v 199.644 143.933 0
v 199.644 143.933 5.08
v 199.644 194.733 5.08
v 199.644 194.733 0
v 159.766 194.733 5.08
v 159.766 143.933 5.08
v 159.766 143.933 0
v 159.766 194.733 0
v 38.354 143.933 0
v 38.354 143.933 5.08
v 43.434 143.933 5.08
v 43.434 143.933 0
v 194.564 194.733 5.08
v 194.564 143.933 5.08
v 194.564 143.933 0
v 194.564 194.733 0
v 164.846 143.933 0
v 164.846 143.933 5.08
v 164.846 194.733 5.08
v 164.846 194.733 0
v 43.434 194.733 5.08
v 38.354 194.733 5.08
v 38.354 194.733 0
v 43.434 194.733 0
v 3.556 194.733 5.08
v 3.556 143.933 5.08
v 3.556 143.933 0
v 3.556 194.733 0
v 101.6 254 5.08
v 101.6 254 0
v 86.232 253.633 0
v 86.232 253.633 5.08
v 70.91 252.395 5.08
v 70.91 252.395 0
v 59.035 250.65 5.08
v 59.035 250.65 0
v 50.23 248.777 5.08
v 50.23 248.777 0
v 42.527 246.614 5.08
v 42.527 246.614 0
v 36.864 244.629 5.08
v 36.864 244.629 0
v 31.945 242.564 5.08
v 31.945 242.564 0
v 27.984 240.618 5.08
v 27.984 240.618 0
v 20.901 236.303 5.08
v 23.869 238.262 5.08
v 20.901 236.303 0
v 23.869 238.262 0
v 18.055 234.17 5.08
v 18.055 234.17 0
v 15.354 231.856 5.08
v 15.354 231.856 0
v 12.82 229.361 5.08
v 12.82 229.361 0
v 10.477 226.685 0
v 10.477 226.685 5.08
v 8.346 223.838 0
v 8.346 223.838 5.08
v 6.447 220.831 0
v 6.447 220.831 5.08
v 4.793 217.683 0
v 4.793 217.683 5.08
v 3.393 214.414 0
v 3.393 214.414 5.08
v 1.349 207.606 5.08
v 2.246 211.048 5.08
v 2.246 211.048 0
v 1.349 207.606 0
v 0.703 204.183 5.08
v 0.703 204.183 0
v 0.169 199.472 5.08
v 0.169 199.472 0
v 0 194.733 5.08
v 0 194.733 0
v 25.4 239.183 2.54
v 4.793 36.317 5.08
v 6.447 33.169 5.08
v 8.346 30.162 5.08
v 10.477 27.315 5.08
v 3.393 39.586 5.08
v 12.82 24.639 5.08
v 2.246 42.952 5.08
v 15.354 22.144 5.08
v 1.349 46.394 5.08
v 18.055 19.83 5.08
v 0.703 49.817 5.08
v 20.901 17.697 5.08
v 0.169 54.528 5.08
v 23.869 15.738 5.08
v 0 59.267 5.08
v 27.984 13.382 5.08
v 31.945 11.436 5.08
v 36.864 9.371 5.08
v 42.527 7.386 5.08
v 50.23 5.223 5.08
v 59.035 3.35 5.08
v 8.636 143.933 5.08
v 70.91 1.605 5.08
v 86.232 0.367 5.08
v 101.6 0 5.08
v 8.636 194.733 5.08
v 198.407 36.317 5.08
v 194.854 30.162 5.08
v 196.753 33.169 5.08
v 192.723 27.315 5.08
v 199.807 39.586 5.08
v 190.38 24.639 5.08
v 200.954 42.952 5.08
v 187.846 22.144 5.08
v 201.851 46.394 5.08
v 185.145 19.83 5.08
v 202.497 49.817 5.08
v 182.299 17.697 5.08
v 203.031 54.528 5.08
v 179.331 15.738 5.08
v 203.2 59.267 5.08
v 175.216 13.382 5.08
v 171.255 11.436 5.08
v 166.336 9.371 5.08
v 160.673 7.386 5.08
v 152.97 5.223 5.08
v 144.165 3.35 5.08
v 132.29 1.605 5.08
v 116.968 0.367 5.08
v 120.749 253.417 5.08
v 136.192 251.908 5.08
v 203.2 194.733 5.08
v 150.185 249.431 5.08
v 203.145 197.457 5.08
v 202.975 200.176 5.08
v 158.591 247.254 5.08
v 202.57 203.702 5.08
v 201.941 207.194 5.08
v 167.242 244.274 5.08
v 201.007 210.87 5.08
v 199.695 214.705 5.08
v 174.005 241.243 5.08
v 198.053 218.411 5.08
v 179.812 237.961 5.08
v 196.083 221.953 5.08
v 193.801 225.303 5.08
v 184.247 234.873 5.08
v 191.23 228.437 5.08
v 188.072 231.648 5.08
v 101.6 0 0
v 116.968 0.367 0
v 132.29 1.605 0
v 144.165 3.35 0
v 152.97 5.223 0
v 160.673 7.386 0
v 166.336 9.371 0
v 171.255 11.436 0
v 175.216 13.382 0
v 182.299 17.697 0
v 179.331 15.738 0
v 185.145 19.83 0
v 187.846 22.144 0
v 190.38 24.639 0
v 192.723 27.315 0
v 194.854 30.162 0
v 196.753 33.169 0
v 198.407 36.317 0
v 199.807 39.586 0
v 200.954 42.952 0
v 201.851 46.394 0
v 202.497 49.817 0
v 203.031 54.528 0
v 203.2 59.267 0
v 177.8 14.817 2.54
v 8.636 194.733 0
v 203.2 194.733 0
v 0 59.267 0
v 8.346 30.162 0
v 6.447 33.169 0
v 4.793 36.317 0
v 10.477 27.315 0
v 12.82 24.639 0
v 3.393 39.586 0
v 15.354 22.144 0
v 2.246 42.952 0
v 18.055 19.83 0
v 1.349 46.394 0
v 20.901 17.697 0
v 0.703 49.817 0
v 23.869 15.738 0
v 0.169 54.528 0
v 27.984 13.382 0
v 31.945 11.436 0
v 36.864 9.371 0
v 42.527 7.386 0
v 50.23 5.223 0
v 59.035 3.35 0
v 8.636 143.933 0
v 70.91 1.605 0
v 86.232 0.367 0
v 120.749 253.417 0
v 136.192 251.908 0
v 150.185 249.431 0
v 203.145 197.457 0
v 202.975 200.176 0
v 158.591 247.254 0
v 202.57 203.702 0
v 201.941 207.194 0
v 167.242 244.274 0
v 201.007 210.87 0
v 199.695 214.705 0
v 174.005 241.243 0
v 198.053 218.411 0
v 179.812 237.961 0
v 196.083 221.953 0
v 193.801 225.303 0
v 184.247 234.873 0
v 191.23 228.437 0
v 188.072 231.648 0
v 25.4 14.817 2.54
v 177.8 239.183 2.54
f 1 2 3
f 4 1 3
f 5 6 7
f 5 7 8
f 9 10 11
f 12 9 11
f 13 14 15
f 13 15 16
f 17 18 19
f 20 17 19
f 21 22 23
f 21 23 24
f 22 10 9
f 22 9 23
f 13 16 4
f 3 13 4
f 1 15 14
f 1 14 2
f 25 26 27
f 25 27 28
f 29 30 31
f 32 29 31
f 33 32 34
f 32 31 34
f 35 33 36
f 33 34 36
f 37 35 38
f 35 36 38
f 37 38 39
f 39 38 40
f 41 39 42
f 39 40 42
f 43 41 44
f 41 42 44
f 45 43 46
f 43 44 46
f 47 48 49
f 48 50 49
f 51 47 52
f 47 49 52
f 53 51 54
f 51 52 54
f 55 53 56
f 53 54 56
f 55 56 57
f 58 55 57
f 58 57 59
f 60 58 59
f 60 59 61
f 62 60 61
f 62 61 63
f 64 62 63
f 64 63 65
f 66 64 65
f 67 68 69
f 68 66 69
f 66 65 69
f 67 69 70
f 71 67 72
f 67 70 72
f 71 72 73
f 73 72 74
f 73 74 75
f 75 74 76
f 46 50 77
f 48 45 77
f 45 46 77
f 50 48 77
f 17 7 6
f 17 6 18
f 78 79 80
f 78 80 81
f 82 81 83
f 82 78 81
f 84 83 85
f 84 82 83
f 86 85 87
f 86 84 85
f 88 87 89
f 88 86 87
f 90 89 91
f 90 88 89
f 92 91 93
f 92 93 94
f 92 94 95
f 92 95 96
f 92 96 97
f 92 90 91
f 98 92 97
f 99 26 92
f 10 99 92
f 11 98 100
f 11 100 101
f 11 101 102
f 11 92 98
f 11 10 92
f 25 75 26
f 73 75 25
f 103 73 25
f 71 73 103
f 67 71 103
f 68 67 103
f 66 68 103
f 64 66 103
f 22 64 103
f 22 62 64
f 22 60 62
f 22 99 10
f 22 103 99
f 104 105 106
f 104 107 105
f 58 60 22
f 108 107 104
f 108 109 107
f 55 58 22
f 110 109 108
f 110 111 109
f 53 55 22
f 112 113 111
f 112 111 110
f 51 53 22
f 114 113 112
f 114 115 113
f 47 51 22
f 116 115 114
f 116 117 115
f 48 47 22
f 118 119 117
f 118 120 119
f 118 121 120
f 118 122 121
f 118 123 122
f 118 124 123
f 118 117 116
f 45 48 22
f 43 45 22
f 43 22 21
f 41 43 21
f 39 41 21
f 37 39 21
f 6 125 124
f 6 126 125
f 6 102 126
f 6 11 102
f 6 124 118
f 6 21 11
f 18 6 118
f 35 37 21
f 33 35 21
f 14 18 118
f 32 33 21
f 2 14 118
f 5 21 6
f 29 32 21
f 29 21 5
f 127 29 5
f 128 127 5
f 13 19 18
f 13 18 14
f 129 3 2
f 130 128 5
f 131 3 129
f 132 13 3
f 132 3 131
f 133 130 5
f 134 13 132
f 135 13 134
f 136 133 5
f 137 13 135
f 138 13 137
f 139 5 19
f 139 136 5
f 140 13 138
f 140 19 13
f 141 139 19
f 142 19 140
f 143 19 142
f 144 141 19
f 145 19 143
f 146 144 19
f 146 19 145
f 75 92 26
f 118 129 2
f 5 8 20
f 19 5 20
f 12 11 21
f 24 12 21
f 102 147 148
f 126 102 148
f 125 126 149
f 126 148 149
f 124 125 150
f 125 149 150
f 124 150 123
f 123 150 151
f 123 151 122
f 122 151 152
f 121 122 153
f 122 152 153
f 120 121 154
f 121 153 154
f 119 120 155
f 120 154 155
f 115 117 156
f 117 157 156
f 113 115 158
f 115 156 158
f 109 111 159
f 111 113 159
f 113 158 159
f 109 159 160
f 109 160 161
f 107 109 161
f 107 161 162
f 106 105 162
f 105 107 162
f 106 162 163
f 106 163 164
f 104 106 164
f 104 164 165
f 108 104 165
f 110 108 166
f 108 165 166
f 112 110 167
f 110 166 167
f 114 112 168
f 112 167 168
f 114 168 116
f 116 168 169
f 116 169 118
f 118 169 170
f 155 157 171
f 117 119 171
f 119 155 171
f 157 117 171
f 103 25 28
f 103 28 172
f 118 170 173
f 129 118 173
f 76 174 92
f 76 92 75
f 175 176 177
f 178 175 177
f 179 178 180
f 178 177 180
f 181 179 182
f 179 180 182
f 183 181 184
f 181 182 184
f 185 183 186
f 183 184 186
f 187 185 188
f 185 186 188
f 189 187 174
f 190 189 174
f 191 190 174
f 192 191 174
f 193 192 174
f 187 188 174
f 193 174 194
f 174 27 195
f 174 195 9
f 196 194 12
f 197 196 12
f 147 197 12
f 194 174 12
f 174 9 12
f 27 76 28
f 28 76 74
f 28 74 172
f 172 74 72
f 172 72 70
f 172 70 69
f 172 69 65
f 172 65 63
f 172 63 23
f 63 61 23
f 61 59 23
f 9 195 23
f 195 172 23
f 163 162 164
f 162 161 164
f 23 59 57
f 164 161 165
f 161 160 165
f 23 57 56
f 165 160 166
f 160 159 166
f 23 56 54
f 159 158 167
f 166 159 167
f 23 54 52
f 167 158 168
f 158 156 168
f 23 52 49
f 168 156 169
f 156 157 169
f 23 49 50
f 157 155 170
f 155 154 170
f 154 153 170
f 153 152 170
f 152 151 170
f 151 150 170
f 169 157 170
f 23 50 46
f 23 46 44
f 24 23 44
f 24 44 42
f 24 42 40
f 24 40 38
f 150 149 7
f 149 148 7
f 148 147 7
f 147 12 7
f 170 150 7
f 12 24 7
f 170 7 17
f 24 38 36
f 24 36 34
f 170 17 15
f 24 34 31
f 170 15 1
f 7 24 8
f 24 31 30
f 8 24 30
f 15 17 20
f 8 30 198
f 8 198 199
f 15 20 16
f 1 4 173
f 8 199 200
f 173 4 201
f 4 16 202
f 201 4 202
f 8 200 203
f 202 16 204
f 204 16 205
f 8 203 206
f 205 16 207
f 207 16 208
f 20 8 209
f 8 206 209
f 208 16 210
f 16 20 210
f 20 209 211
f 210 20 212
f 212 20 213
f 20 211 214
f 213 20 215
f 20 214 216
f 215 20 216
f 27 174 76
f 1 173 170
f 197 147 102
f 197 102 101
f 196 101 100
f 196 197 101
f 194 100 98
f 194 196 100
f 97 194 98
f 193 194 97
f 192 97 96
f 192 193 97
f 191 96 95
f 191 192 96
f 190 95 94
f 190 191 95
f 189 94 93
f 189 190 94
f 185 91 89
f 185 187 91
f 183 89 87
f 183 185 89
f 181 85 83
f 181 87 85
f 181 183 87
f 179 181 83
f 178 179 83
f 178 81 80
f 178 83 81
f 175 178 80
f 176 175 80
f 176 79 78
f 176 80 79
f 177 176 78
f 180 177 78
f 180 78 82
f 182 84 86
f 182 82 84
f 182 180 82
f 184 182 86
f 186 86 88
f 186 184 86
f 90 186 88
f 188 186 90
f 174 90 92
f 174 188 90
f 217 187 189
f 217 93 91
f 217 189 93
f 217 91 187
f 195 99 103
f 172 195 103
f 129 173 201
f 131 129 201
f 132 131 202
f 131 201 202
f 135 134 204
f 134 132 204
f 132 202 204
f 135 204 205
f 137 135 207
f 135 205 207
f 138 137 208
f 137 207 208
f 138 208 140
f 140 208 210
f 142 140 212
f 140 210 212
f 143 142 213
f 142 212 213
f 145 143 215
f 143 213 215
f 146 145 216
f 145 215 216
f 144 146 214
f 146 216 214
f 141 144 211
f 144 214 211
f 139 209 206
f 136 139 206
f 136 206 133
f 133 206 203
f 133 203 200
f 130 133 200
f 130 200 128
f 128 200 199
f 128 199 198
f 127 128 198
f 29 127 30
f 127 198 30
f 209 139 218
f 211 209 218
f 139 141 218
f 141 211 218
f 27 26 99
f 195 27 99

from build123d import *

# Parameters (mm, degrees)
SKETCH1_W           = 203.2
SKETCH1_H           = 254
BOSS_EXTRUDE1_DEPTH = 5.08
FILLET1_SIZE        = 59.266666667
FILLET1_SIZE_2      = 101.6
SKETCH7_W           = 5.08
SKETCH7_H           = 50.8
CUT_EXTRUDE1_DEPTH  = 326.318377121


with BuildPart() as part:
    # Sketch1 → Boss-Extrude1 (new body)
    with BuildSketch(Plane.XY):
        with Locations((101.6, 127)):
            Rectangle(SKETCH1_W, SKETCH1_H)
    extrude(amount=BOSS_EXTRUDE1_DEPTH)

    # Fillet1
    # a fillet whose section is not a circle: 101.6, 59.266666667 mm, written as the material it takes off along each edge
    with BuildSketch(Plane(origin=(203.2, 254, -254), x_dir=(0, -1, 0), z_dir=(0, 0, 1))) as fillet1_piece_1:
        with BuildLine():
            Bezier((FILLET1_SIZE, 0), (0, 0), (0, -FILLET1_SIZE_2), weights=[1, 1, 1])
            Line((0, -FILLET1_SIZE_2), (0, 0))
            Line((0, 0), (FILLET1_SIZE, 0))
        make_face()
    extrude(amount=513.08, mode=Mode.SUBTRACT)
    with BuildSketch(Plane(origin=(0, 254, -254), x_dir=(1, 0, 0), z_dir=(0, 0, 1)), Plane(origin=(203.2, 0, -254), x_dir=(-1, 0, 0), z_dir=(0, 0, 1))) as fillet1_piece_2:
        with BuildLine():
            Bezier((FILLET1_SIZE_2, 0), (0, 0), (0, -FILLET1_SIZE), weights=[1, 1, 1])
            Line((0, -FILLET1_SIZE), (0, 0))
            Line((0, 0), (FILLET1_SIZE_2, 0))
        make_face()
    extrude(amount=513.08, mode=Mode.SUBTRACT)
    with BuildSketch(Plane(origin=(0, 0, -254), x_dir=(1, 0, 0), z_dir=(0, 0, 1))) as fillet1_piece_3:
        with BuildLine():
            Bezier((FILLET1_SIZE_2, 0), (0, 0), (0, FILLET1_SIZE), weights=[1, 1, 1])
            Line((0, FILLET1_SIZE), (0, 0))
            Line((0, 0), (FILLET1_SIZE_2, 0))
        make_face()
    extrude(amount=513.08, mode=Mode.SUBTRACT)

    # Sketch7 → Cut-Extrude1 (cut, through all)
    with BuildSketch(Plane.XY.offset(5.08)):
        with Locations((6.096, 169.333333333)):
            Rectangle(SKETCH7_W, SKETCH7_H)
        with Locations((40.894, 169.333333333)):
            Rectangle(SKETCH7_W, SKETCH7_H)
        with Locations((197.104, 169.333333333)):
            Rectangle(SKETCH7_W, SKETCH7_H)
        with Locations((162.306, 169.333333333)):
            Rectangle(SKETCH7_W, SKETCH7_H)
    extrude(amount=-CUT_EXTRUDE1_DEPTH, mode=Mode.SUBTRACT)


solid = part.part
